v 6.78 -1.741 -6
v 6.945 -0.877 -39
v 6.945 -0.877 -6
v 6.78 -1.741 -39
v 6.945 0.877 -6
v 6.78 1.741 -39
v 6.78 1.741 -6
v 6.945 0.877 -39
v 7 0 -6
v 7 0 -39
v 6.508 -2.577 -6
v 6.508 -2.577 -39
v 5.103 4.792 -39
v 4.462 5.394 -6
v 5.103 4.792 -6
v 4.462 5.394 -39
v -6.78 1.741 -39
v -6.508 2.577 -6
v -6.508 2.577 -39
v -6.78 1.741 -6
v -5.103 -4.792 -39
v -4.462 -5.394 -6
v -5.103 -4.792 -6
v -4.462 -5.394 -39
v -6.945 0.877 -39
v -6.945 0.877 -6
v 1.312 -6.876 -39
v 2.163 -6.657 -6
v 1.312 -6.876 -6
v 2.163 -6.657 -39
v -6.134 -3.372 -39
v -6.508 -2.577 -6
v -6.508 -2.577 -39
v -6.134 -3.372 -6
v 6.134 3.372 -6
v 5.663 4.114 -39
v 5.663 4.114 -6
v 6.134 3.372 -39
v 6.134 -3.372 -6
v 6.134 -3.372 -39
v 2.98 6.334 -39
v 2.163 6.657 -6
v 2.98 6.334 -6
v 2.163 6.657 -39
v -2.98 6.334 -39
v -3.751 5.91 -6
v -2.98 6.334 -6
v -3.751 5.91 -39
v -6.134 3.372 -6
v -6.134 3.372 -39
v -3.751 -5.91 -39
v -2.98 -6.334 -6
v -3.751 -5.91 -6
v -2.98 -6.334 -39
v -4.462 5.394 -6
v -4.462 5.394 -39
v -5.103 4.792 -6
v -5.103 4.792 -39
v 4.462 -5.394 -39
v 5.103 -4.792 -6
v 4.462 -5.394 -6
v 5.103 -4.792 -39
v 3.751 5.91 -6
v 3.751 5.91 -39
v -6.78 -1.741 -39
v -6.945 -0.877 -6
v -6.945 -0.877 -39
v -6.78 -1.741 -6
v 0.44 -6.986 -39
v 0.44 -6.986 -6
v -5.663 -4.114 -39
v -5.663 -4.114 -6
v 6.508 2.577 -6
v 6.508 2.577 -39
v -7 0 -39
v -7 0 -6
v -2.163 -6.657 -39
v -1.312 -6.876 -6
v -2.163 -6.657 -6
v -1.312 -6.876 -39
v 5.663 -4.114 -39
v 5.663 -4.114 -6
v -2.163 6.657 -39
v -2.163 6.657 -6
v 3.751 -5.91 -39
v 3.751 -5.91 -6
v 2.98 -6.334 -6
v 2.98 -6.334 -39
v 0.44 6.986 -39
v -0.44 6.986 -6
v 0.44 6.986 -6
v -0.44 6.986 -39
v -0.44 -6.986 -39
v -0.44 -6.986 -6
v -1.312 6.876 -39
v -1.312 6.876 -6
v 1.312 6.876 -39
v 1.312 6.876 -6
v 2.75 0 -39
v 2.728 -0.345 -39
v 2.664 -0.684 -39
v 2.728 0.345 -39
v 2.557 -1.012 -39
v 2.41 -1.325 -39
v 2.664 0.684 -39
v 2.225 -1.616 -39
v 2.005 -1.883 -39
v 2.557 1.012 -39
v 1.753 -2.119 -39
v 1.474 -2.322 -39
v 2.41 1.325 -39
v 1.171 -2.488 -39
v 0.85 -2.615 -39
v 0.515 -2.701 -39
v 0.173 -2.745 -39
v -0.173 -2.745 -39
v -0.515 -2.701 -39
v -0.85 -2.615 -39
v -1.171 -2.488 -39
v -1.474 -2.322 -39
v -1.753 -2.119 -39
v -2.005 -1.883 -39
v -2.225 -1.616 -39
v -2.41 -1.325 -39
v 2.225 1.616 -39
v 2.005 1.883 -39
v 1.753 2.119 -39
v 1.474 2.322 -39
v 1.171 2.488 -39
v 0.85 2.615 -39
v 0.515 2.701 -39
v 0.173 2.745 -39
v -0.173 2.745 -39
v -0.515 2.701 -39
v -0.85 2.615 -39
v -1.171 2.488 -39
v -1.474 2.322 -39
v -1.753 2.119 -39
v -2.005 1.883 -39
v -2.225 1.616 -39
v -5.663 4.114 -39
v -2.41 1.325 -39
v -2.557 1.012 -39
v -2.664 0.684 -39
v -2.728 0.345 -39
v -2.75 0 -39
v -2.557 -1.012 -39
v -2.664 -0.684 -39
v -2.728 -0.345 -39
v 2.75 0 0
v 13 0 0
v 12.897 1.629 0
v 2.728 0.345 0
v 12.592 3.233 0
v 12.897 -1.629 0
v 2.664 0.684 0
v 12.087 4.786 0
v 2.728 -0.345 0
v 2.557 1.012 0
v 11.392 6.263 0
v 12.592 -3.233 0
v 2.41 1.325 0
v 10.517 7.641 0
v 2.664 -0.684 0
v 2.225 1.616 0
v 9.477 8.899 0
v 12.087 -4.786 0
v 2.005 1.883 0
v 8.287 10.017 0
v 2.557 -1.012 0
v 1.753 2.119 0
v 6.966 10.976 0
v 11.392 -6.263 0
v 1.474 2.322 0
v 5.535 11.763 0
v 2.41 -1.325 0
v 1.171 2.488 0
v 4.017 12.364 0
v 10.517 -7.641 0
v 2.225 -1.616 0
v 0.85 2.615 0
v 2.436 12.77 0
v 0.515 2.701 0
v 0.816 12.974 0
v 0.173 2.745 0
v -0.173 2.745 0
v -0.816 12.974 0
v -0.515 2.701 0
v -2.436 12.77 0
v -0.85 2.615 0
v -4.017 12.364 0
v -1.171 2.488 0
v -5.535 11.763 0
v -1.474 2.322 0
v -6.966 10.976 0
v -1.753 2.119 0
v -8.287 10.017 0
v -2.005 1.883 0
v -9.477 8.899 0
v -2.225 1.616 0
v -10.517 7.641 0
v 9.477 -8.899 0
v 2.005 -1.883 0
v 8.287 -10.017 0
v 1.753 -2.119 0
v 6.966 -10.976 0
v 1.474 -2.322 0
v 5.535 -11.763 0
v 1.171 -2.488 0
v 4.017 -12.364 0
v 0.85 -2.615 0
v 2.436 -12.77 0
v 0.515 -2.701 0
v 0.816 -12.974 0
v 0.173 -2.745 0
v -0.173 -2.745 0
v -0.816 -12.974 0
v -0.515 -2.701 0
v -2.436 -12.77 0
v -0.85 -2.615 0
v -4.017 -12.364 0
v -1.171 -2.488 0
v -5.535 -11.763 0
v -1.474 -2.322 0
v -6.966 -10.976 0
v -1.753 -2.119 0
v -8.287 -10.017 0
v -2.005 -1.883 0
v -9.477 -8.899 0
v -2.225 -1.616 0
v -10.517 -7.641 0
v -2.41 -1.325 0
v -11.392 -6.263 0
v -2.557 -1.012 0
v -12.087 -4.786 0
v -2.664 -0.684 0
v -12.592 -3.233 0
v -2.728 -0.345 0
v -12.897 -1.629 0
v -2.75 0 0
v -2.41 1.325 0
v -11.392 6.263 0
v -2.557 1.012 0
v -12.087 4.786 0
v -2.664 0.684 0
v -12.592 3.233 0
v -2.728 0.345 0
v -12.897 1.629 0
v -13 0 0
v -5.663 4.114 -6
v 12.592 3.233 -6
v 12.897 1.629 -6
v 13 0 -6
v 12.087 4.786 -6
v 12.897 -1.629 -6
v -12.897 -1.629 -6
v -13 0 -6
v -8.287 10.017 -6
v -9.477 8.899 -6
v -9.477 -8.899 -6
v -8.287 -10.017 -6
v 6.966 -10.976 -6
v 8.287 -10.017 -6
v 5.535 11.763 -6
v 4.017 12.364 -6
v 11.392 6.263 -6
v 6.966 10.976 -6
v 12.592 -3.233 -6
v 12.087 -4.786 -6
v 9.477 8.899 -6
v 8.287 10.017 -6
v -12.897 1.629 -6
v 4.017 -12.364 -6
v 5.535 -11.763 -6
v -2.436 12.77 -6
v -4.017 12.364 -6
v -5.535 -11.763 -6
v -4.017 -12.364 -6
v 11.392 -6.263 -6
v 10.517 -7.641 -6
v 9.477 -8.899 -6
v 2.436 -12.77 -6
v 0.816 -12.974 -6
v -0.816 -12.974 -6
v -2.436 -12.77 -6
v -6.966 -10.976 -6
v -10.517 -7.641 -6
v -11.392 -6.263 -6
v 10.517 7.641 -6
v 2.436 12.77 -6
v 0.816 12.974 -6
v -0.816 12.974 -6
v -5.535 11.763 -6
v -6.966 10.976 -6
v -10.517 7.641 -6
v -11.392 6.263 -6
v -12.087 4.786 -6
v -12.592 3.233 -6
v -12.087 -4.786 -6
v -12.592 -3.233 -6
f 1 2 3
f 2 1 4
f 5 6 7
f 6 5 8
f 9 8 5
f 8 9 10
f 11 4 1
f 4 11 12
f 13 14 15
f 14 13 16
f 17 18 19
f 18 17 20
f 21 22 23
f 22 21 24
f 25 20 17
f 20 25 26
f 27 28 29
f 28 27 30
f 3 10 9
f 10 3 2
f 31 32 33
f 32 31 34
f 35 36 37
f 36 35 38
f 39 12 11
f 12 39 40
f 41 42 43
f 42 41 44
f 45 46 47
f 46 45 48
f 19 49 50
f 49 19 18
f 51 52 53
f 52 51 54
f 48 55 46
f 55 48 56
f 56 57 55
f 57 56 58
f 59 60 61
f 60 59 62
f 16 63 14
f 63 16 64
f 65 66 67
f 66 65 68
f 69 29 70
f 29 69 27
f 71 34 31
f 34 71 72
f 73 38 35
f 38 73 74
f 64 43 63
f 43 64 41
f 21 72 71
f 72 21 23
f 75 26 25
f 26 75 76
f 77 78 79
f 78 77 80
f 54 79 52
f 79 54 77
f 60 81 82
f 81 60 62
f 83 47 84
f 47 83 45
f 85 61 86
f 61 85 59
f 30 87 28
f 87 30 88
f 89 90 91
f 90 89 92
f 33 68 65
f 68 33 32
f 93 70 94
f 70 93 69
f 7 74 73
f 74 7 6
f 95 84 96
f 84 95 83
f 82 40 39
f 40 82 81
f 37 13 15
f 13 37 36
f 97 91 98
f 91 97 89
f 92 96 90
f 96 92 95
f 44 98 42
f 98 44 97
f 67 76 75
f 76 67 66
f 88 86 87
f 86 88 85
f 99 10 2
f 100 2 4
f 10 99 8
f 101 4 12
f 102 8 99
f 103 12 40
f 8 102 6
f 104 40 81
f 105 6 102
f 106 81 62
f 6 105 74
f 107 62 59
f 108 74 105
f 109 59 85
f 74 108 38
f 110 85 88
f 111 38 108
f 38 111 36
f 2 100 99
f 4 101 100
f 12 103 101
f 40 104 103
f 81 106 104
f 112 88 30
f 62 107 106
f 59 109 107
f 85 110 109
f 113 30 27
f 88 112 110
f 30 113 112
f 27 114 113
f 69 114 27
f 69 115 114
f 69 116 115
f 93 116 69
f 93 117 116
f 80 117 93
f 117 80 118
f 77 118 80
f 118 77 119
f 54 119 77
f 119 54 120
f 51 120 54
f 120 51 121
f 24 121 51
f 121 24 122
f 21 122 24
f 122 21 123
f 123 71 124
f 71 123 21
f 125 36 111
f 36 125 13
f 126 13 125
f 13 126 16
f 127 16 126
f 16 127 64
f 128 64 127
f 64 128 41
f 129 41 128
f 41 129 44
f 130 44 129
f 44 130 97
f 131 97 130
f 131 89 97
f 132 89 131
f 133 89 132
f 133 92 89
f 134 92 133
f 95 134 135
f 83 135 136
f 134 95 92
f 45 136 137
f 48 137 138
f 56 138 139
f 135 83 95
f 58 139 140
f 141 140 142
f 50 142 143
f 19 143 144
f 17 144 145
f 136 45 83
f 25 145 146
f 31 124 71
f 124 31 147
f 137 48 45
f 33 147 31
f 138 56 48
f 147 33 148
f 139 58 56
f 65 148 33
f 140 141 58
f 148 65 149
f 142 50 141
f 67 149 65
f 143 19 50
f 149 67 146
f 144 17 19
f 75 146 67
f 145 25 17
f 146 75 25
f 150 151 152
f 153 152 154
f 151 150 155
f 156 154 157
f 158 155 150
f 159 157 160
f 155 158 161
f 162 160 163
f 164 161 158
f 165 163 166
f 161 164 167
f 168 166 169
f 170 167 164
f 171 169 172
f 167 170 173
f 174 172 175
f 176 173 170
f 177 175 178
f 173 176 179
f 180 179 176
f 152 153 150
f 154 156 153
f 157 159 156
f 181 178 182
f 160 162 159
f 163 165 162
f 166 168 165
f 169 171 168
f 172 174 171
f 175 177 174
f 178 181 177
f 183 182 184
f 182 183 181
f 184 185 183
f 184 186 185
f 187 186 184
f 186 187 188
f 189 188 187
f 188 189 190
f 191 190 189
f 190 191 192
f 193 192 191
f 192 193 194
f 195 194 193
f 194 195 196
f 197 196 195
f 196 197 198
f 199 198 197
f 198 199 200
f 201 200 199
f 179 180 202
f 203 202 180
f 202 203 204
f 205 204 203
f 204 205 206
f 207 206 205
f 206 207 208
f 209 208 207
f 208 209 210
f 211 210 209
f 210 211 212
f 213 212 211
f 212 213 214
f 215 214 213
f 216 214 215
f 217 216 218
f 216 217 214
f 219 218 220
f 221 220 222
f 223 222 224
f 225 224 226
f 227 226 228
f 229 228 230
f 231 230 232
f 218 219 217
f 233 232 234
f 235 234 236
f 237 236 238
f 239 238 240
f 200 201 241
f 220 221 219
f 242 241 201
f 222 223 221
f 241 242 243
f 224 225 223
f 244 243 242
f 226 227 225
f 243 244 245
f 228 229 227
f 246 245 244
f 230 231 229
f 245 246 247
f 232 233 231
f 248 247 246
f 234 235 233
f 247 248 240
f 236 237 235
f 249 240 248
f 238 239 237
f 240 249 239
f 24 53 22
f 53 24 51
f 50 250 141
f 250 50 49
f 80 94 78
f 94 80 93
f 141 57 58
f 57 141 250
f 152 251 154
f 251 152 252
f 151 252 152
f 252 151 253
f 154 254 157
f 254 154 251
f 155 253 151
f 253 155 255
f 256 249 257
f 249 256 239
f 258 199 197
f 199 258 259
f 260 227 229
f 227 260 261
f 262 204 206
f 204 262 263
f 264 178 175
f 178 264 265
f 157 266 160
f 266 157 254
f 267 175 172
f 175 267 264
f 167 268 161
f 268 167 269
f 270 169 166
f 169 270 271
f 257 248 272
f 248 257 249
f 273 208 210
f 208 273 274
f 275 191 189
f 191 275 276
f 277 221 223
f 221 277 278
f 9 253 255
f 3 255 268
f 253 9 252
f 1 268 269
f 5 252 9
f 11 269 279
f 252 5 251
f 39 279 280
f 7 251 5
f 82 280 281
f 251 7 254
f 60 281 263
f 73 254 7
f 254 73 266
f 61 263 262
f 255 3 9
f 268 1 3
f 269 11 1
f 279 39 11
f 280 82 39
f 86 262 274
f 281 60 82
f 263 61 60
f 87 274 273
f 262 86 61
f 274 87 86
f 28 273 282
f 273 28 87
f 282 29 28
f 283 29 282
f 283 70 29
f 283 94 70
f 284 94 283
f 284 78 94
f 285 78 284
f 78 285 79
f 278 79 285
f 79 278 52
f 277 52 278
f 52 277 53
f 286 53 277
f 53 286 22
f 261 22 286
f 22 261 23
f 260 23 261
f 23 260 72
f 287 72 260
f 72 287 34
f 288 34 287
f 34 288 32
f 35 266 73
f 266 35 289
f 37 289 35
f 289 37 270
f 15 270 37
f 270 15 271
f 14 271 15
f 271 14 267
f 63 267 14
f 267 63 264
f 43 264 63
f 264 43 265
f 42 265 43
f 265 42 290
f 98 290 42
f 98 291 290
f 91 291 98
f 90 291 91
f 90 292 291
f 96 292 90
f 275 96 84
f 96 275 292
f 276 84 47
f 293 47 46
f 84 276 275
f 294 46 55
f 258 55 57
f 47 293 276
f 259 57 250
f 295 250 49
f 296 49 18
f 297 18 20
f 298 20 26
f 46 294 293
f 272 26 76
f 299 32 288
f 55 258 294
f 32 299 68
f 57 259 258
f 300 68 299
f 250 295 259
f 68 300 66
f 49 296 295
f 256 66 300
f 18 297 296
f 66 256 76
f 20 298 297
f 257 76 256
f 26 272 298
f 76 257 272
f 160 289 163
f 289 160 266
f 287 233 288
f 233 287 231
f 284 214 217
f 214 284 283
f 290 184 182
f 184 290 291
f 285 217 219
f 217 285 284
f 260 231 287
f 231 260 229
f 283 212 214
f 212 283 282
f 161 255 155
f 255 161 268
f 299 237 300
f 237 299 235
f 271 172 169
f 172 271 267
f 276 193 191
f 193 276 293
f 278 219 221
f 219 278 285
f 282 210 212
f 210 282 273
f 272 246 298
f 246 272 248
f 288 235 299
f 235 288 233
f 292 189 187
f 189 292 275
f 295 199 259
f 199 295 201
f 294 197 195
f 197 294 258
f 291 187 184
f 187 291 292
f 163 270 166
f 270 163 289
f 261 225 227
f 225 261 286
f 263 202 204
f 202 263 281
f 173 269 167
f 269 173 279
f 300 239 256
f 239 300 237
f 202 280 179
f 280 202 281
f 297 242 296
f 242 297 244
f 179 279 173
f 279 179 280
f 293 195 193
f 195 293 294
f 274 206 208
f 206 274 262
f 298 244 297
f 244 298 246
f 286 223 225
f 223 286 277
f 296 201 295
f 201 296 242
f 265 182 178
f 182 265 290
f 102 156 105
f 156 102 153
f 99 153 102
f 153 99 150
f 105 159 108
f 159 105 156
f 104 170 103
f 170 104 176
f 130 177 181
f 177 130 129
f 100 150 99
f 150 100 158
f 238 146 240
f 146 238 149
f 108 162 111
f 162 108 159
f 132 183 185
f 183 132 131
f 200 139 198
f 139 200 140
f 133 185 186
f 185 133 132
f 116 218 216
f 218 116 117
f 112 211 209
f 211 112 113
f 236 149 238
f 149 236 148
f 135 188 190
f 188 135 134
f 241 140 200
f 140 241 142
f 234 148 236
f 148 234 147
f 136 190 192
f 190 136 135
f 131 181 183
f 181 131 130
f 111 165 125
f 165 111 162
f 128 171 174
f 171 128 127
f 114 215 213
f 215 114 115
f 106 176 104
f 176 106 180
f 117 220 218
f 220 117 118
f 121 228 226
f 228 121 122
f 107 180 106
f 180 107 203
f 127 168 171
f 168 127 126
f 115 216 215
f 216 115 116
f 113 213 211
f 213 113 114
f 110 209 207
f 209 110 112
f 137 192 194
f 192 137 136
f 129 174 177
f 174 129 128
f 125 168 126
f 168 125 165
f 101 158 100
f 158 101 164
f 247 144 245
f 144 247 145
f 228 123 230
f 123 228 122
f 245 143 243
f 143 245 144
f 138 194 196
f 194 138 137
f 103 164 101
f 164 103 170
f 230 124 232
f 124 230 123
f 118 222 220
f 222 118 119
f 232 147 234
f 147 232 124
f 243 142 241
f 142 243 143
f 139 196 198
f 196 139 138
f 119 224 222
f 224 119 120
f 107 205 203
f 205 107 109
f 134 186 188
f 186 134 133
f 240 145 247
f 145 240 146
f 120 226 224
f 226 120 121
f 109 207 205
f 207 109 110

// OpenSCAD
$fn = 50;


difference() {
	union() {
		translate(v = [0, 0, -39.0000000000]) {
			cylinder(h = 39, r = 7.0000000000);
		}
		translate(v = [0, 0, -6.0000000000]) {
			cylinder(h = 6, r = 13.0000000000);
		}
	}
	union() {
		#translate(v = [0, 0, -39]) {
			cylinder(h = 39, r = 2.7500000000);
		}
	}
}
